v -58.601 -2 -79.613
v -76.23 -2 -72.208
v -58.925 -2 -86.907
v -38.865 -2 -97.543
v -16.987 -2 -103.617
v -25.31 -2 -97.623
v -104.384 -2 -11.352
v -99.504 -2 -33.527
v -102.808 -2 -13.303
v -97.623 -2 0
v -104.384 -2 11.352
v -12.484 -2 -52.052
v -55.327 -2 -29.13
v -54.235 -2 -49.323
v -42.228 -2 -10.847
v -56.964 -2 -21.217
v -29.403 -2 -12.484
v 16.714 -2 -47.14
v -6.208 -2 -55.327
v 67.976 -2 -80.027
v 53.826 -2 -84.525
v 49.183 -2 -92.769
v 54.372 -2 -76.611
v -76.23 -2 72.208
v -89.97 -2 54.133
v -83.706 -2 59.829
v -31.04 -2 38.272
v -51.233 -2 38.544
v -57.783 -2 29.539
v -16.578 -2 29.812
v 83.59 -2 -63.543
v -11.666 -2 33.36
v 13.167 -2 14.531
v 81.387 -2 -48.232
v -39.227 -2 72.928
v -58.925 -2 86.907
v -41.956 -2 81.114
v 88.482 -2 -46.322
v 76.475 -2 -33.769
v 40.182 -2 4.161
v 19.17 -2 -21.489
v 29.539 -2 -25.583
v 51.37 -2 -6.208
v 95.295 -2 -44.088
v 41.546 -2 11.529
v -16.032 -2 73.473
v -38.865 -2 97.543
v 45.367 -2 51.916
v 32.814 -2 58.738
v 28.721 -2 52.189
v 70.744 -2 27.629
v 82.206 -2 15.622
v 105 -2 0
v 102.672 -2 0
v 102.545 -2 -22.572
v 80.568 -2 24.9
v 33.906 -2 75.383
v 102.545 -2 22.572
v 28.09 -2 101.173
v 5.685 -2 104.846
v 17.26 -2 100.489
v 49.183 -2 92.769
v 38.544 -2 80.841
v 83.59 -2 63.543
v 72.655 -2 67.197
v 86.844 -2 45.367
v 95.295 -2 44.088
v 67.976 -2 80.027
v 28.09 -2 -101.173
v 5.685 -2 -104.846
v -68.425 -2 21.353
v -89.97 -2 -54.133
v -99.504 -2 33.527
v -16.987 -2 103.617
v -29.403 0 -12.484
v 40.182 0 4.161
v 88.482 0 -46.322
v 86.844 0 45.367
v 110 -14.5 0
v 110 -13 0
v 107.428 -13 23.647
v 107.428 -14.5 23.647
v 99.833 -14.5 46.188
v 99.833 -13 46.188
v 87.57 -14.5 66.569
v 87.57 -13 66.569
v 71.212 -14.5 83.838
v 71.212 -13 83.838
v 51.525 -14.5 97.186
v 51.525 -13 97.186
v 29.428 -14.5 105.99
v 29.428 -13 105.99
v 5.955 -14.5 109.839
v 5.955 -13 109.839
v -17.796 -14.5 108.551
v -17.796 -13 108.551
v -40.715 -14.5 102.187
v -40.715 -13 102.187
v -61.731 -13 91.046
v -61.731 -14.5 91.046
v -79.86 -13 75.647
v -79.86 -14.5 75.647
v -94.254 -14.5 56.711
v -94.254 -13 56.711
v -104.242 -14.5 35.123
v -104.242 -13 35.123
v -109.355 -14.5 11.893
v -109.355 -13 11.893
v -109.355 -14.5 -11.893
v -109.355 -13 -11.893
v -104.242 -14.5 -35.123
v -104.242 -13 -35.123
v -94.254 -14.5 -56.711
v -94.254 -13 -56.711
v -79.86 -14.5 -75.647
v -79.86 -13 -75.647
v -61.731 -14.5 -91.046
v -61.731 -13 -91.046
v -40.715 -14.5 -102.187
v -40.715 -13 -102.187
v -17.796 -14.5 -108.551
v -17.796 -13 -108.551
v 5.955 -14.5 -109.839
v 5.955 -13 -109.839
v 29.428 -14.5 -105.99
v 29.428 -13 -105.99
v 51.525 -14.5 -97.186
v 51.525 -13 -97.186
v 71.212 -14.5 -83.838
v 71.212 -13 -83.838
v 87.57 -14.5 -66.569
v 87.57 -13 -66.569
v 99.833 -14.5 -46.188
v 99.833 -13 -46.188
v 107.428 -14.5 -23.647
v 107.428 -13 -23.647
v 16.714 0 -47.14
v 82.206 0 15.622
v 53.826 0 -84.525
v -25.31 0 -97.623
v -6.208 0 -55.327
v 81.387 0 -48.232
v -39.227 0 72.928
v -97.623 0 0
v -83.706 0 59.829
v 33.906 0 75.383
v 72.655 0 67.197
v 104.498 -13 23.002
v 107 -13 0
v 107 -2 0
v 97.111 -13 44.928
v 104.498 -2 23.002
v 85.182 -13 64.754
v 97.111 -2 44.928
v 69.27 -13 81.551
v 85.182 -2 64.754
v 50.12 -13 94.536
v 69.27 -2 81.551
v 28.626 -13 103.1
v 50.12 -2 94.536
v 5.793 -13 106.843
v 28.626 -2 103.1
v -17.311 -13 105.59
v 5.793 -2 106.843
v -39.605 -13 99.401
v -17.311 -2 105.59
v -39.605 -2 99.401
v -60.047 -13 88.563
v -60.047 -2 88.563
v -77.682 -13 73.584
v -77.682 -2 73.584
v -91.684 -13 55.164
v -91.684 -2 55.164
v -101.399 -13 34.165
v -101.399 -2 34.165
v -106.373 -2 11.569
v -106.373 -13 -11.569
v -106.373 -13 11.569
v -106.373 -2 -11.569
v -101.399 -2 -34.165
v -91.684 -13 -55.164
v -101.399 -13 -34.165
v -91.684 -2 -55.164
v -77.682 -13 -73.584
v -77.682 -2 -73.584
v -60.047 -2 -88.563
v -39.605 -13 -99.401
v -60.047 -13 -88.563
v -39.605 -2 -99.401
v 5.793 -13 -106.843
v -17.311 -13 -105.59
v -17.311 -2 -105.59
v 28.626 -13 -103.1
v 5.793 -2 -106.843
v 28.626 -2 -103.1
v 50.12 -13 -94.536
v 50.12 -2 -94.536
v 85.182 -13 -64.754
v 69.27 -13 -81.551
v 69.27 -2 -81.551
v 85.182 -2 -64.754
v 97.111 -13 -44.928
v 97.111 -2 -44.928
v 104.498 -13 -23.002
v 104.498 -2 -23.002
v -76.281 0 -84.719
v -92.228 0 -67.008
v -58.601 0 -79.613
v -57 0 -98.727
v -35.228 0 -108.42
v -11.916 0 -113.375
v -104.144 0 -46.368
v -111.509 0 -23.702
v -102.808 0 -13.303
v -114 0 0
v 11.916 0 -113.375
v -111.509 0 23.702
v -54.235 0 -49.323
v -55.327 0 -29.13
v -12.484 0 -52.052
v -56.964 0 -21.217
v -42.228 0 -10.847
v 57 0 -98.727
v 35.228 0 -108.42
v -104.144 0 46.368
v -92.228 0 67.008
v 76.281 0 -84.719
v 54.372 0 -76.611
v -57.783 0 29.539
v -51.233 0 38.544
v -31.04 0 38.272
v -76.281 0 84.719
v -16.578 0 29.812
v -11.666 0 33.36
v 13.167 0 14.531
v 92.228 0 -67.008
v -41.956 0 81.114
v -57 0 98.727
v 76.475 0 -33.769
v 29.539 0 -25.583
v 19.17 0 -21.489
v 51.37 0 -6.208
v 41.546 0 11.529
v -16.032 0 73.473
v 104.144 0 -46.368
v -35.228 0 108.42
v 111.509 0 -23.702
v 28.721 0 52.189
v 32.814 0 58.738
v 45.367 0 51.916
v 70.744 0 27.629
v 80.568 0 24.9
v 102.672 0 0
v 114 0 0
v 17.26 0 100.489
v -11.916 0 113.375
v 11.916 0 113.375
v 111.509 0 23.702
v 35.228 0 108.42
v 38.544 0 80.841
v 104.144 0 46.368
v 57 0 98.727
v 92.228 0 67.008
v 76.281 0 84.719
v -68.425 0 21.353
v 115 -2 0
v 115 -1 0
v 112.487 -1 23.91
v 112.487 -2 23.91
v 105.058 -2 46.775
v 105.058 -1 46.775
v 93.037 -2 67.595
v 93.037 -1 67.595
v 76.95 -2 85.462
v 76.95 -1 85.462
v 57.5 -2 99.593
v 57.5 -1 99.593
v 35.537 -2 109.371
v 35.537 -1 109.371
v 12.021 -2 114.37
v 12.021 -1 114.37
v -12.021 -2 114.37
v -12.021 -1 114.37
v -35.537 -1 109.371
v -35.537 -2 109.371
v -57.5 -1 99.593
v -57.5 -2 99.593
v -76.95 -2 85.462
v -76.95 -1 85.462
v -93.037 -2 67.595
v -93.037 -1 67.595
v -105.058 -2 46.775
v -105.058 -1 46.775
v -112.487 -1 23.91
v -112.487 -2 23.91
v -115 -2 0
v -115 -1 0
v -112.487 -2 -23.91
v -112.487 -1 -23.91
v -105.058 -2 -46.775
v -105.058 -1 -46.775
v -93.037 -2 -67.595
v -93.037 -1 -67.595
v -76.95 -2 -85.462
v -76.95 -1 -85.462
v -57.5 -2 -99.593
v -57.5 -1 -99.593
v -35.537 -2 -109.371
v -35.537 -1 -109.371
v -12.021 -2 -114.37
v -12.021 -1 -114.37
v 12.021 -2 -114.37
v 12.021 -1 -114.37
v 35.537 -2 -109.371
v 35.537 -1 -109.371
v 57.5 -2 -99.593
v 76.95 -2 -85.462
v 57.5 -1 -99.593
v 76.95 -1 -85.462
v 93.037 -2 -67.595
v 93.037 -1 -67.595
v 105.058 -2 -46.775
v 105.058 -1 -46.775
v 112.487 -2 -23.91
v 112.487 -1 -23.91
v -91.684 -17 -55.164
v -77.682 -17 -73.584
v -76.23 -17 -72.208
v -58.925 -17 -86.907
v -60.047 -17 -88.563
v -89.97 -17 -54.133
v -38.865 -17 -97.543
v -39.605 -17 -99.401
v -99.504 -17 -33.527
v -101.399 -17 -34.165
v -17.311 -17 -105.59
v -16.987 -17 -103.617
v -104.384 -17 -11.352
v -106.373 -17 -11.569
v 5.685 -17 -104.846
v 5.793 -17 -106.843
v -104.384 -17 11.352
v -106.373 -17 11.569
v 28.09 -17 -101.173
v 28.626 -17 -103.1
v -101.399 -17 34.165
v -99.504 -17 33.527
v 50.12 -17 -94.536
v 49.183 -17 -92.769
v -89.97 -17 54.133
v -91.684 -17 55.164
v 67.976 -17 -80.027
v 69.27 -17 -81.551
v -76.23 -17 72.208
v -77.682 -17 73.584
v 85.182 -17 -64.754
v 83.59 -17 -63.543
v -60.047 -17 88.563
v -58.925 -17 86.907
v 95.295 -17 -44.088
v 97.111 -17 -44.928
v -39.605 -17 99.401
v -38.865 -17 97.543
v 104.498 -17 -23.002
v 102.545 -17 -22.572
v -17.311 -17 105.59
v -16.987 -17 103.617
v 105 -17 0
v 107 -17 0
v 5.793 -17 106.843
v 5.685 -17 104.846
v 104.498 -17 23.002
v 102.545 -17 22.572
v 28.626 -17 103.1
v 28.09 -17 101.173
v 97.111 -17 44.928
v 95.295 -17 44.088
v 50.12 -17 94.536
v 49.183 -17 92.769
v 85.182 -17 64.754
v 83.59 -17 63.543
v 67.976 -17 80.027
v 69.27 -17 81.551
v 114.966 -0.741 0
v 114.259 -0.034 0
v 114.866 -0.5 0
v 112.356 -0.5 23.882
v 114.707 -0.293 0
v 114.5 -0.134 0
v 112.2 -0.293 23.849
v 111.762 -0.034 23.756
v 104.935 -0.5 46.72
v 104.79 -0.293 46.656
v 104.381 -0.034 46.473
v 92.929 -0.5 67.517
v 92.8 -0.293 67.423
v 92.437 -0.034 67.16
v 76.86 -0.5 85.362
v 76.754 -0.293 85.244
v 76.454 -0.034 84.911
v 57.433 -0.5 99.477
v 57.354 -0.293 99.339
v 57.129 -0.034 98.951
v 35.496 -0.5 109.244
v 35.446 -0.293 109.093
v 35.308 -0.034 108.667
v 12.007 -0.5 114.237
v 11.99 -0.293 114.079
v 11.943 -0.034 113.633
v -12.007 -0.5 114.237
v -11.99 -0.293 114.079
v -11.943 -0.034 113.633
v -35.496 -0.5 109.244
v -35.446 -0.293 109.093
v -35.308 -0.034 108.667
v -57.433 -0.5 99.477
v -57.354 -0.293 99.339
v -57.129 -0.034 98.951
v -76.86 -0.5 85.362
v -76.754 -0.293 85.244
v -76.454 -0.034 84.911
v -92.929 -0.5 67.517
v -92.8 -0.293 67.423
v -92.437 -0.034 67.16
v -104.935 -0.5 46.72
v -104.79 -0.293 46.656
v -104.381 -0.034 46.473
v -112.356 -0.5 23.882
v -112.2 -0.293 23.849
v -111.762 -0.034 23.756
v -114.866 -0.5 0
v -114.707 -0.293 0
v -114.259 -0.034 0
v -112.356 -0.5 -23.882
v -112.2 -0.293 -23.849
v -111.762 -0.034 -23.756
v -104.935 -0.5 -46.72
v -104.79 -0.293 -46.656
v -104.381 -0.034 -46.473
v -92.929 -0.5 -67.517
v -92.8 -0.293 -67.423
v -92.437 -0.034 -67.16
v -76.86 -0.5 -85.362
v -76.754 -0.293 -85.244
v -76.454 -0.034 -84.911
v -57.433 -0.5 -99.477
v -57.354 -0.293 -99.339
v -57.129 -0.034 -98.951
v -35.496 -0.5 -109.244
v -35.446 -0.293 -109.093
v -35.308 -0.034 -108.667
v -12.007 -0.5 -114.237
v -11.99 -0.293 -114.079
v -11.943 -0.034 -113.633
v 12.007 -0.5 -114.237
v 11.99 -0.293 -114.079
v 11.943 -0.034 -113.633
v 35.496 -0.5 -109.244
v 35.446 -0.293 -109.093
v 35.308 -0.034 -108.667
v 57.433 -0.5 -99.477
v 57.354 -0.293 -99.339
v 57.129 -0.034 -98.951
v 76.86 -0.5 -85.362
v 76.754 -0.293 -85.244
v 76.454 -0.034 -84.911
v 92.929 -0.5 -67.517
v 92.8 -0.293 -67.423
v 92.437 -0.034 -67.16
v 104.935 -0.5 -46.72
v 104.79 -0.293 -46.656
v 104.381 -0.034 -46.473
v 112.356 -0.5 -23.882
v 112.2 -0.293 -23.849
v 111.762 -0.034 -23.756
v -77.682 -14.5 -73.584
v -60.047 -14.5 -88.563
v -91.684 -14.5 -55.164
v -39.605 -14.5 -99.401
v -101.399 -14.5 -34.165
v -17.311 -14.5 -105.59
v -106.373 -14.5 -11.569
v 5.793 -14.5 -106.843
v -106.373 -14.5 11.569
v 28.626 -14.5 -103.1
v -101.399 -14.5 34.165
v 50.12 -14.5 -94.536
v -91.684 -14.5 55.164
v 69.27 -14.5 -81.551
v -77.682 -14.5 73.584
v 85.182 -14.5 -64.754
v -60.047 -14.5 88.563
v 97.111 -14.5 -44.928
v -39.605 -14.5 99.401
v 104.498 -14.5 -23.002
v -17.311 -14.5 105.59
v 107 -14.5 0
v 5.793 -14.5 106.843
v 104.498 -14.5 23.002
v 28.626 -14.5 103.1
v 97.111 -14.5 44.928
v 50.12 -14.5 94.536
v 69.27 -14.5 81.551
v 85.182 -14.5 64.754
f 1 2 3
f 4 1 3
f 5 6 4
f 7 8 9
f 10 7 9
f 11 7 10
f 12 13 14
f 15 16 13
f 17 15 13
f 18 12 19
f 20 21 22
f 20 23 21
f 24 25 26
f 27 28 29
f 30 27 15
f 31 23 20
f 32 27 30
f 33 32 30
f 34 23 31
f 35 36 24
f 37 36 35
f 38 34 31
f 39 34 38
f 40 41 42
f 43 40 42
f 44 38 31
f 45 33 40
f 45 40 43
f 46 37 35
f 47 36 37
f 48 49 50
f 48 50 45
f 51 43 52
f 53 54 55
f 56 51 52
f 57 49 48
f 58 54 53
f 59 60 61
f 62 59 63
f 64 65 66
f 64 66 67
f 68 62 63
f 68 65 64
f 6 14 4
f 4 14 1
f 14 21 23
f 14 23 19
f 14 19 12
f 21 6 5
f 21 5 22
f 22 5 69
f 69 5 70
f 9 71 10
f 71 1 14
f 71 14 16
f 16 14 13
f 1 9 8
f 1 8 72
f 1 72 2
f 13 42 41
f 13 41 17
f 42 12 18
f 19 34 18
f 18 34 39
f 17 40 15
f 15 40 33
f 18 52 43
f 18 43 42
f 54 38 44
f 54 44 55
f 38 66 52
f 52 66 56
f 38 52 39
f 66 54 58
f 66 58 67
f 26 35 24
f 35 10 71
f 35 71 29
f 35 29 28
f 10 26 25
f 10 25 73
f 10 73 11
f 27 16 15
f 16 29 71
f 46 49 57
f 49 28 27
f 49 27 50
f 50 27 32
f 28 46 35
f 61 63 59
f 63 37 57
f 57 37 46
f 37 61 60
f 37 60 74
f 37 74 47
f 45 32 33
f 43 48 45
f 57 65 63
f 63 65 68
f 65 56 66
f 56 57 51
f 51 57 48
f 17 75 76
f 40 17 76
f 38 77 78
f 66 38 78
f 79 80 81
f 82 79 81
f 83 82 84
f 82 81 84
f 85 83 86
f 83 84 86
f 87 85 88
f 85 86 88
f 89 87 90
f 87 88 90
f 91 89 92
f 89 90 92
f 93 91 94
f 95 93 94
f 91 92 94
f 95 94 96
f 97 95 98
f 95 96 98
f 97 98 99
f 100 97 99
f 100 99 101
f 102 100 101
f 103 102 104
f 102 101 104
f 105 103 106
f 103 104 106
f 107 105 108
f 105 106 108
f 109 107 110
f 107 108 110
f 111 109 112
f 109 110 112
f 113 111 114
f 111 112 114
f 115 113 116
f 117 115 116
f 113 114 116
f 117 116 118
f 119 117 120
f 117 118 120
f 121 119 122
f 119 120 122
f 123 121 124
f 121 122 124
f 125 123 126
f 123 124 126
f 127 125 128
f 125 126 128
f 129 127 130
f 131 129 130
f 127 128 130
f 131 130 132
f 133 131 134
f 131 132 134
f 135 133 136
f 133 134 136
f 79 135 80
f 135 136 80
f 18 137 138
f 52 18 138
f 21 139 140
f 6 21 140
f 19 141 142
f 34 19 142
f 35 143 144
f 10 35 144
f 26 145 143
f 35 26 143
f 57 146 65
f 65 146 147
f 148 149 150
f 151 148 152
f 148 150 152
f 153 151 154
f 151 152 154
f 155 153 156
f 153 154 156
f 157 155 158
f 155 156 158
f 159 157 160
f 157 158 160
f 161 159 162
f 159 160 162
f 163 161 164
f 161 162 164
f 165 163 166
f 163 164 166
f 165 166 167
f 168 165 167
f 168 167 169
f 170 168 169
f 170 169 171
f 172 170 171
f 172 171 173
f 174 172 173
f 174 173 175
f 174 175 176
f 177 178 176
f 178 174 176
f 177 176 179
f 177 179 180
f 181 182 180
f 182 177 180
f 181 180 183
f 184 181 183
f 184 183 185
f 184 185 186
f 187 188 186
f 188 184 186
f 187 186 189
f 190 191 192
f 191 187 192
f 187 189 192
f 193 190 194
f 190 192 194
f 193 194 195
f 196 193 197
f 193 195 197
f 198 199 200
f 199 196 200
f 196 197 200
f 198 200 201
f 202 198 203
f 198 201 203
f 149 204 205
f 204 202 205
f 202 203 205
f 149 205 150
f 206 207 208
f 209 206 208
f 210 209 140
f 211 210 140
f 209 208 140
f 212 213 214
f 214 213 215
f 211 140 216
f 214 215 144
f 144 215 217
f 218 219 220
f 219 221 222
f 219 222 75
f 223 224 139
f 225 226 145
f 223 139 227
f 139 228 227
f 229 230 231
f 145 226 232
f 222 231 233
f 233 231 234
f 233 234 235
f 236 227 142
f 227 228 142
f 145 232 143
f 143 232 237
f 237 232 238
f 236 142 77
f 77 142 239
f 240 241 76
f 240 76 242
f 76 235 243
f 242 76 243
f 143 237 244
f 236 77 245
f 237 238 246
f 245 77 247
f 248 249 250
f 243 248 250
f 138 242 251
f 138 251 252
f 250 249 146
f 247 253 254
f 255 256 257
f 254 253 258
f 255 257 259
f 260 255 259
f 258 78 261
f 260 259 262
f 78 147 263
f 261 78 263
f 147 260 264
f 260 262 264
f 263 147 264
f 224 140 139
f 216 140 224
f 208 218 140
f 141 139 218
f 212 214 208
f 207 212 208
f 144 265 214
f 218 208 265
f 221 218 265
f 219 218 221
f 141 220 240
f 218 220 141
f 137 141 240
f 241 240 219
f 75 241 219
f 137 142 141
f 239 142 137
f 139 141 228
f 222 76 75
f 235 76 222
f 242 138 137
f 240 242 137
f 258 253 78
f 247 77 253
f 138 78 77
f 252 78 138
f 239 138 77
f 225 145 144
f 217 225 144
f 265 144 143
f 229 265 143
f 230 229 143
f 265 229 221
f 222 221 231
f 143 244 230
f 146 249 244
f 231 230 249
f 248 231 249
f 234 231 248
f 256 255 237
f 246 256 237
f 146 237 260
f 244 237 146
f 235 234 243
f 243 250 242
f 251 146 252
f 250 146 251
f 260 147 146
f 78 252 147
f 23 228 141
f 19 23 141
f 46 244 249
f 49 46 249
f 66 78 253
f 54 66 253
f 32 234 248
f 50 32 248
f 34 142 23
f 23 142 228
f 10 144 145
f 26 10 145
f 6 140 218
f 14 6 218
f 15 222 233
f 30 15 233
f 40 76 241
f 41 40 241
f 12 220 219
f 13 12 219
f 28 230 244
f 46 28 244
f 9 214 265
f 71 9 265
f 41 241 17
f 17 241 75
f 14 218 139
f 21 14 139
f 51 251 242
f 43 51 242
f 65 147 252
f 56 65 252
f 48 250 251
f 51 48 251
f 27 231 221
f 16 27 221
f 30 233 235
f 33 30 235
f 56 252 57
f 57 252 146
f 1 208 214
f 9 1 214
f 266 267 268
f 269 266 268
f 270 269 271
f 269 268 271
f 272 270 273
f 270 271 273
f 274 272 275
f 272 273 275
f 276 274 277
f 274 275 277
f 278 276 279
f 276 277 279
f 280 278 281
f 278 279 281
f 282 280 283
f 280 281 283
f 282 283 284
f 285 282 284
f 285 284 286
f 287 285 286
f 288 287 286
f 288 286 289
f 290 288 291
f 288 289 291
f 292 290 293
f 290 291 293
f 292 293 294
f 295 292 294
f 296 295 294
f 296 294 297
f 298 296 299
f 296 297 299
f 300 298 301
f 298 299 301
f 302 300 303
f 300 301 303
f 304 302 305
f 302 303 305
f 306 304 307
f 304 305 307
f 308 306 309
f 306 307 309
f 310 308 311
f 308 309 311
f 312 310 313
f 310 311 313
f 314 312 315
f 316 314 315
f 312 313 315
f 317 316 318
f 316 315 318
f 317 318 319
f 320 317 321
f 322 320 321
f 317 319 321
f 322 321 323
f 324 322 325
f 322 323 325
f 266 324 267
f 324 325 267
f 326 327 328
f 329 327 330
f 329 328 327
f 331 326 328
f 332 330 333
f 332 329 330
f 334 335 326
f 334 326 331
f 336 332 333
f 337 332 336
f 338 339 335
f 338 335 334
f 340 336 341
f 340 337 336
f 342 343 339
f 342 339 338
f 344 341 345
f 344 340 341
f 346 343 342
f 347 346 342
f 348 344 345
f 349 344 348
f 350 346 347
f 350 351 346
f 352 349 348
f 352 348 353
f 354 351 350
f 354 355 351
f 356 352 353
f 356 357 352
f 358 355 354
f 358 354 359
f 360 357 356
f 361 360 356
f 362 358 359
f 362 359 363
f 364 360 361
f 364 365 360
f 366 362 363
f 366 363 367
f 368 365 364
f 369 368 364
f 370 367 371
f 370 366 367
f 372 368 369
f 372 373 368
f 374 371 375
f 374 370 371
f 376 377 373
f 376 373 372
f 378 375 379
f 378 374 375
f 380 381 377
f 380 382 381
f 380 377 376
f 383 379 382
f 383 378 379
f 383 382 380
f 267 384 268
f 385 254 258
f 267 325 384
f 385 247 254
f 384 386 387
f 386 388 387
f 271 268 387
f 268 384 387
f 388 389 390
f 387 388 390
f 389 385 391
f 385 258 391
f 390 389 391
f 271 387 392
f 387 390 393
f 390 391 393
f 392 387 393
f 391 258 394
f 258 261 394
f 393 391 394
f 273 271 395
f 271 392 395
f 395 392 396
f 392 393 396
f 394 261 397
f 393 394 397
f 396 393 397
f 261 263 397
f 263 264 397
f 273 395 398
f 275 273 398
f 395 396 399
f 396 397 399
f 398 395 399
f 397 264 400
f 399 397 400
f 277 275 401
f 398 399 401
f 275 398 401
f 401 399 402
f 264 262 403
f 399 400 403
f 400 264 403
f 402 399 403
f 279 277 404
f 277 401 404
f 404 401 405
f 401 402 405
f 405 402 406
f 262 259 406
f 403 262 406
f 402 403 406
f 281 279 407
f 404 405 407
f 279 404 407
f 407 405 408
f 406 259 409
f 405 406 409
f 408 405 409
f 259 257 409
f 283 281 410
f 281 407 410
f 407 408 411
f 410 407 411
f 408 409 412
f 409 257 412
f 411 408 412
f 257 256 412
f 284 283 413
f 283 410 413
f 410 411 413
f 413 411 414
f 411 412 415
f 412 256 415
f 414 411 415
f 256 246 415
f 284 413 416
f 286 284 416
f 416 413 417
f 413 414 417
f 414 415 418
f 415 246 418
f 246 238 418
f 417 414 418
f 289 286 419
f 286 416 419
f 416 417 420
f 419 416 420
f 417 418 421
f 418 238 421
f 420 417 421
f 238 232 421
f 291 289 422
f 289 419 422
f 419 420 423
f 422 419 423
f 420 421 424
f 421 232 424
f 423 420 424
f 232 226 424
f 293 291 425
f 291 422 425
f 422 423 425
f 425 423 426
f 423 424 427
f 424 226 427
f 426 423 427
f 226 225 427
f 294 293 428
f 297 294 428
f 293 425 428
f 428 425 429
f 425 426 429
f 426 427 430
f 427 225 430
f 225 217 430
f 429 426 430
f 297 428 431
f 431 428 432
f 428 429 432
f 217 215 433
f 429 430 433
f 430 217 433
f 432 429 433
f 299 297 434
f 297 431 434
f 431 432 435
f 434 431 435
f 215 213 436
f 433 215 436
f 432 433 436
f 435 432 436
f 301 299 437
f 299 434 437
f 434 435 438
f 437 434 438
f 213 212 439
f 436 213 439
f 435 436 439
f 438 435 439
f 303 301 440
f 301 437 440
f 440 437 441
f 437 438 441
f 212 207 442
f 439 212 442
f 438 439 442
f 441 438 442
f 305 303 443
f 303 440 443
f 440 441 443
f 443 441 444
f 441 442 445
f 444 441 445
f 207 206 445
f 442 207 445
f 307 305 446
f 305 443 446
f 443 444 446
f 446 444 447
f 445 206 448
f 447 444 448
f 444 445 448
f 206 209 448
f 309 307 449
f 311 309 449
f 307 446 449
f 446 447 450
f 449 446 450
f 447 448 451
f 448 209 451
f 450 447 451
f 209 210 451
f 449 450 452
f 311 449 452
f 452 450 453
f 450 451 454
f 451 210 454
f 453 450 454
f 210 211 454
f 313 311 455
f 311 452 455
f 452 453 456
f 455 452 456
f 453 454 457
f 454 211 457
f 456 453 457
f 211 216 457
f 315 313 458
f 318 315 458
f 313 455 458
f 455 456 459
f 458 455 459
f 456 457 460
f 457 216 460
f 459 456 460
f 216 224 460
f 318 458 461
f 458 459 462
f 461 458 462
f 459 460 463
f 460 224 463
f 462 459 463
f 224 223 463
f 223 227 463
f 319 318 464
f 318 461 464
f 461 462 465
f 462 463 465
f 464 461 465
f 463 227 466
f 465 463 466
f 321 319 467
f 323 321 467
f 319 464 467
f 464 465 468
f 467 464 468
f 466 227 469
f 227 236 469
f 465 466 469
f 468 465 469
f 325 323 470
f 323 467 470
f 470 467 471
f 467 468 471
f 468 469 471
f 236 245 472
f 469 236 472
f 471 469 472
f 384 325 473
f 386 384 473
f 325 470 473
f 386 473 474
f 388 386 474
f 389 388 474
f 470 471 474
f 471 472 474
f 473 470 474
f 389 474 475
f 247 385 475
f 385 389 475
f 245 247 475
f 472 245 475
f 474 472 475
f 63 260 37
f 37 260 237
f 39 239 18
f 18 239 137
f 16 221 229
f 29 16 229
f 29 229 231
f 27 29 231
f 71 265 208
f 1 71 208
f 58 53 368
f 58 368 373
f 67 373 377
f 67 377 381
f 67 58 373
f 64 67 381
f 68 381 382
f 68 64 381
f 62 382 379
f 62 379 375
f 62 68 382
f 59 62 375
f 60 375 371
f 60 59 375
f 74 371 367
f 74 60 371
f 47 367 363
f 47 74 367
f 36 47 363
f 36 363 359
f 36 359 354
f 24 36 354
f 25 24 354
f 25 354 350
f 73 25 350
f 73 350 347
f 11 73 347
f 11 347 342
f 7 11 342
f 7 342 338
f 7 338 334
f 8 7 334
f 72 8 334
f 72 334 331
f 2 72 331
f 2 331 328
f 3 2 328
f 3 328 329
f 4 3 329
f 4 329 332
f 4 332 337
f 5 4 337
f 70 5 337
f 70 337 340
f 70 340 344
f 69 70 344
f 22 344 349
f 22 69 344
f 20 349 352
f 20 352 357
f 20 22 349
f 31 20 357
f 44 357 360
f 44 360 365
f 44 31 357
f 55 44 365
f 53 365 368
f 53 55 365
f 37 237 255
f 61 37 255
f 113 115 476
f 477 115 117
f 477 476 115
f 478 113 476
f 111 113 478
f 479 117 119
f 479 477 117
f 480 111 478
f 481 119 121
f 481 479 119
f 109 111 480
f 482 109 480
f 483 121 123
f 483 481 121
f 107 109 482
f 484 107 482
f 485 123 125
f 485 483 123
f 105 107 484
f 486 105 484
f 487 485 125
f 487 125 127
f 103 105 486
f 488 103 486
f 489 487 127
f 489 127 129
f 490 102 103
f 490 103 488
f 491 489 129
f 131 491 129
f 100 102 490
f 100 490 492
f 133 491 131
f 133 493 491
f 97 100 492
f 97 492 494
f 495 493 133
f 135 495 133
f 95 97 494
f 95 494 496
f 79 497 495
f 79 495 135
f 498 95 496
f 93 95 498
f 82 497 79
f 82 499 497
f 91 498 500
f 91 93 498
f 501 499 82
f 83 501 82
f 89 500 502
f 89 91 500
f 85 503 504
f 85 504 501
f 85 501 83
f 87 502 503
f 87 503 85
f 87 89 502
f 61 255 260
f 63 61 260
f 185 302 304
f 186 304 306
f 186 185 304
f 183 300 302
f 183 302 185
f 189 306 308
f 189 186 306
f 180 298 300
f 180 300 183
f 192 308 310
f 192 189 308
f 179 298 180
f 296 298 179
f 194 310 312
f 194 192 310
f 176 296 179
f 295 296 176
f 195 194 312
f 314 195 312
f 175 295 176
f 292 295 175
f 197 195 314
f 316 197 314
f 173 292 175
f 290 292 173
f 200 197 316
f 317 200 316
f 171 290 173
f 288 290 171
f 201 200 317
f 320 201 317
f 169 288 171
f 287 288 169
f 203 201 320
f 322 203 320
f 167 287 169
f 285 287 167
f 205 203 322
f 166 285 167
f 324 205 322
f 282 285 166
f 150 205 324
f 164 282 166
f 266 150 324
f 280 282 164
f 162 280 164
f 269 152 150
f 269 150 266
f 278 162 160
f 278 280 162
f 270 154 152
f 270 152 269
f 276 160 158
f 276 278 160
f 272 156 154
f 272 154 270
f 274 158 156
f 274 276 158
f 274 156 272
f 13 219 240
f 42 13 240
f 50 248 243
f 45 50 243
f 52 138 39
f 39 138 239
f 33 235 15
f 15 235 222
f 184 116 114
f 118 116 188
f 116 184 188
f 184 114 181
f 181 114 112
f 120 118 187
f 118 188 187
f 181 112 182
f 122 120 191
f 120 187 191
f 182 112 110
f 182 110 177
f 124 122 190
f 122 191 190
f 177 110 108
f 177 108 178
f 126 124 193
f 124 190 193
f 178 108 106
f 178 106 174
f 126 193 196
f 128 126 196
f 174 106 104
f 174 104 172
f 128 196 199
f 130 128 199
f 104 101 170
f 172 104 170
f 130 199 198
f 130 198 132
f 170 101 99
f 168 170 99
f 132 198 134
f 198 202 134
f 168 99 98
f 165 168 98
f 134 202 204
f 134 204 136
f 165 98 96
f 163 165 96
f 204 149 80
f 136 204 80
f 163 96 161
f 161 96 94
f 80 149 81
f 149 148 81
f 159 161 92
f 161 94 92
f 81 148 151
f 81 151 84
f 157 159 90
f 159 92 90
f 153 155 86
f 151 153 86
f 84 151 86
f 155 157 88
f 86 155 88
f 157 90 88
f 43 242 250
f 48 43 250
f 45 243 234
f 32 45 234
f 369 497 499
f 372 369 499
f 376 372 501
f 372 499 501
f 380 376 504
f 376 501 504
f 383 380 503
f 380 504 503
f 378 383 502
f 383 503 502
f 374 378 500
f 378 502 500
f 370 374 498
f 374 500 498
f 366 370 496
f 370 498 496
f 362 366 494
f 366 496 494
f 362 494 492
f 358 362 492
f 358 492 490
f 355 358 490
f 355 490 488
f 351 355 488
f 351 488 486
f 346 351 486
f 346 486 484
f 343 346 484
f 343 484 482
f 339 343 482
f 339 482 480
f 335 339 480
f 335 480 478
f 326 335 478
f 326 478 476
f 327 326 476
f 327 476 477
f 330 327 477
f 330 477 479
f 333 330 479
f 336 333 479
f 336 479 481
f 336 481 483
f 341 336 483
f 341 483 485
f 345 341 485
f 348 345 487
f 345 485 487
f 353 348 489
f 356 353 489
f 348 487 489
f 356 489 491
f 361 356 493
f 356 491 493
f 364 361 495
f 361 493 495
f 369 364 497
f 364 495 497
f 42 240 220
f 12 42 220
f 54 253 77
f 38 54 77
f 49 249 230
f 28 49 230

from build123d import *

# Parameters (mm, degrees)
F0_R      = 115
F1_DEPTH  = 2
F2_R      = 107
F2_R_2    = 105
F3_DEPTH  = 15
F5_R      = 110
F6_DEPTH  = 1.5
F7_R      = 1
F6_FACE_R = 105
F9_DEPTH  = 12
F11_DEPTH = 15
F13_DEPTH = 15


with BuildPart() as f1:
    # F0 (on Front) → F1 (new body)
    with BuildSketch(Plane.XZ):
        Circle(F0_R)
    extrude(amount=F1_DEPTH)

    # F2 (on face) → F3 (join)
    with BuildSketch(Plane.XZ.offset(2)):
        Circle(F2_R)
        Circle(F2_R_2, mode=Mode.SUBTRACT)
    extrude(amount=F3_DEPTH)

    # F5 (on offset) → F6 (join)
    with BuildSketch(Plane.XZ.offset(13)):
        Circle(F5_R)
    extrude(amount=F6_DEPTH)

    # F7
    f7_edges = [f1.edges().sort_by_distance(p)[0] for p in [
        (-115, 0, 0),
    ]]
    fillet(f7_edges, radius=F7_R)

    # F6_face (on face) → F9 (cut)
    with BuildSketch(Plane.XZ.offset(14.5)):
        Circle(F6_FACE_R)
    extrude(amount=-F9_DEPTH, mode=Mode.SUBTRACT)

    # F10 (on face) → F11 (cut)
    with BuildSketch(Plane(origin=(0, 0, 0), x_dir=(-1, 0, 0), z_dir=(0, 1, 0))):
        Polygon((-17.259745, 100.488558), (-38.544491, 80.841102), (41.955505, 81.113979), align=None)
        Polygon((83.706349, 59.829235), (39.226692, 72.927542), (97.623304, 0), align=None)
        Polygon((102.808043, -13.302966), (68.425, 21.352965), (58.601268, -79.613134), align=None)
        Polygon((25.309743, -97.623304), (54.235172, -49.323305), (-53.825844, -84.524997), align=None)
        Polygon((-81.386864, -48.231781), (-54.37161, -76.611444), (6.208051, -55.326693), align=None)
        Polygon((-102.671608, 0), (-88.481776, -46.321612), (-86.844489, 45.366522), align=None)
        Polygon((-33.905506, 75.383477), (-72.654657, 67.197032), (-80.568217, 24.900423), align=None)
    extrude(amount=-F11_DEPTH, mode=Mode.SUBTRACT)

    # F12 (on face) → F13 (cut)
    with BuildSketch(Plane(origin=(0, 0, 0), x_dir=(-1, 0, 0), z_dir=(0, 1, 0))):
        Polygon((16.031779, 73.473305), (-32.813981, 58.73771), (51.23347, 38.544491), align=None)
        Polygon((57.782628, 29.539406), (31.040253, 38.27161), (56.963984, -21.216525), align=None)
        Polygon((12.484324, -52.052118), (55.326689, -29.130084), (-29.539406, -25.582626), align=None)
        Polygon((-76.474994, -33.769067), (-16.713982, -47.140256), (-82.205504, 15.622457), align=None)
        Polygon((-51.369913, -6.208051), (-45.366526, 51.915679), (-70.744492, 27.629238), align=None)
        Polygon((11.665677, 33.359747), (-28.720763, 52.18856), (-41.546185, 11.529238), align=None)
        Polygon((42.22839, -10.847033), (16.577544, 29.812288), (-13.166525, 14.530932), align=None)
        Polygon((-19.169914, -21.489406), (29.402964, -12.484322), (-40.181778, 4.161441), align=None)
    extrude(amount=-F13_DEPTH, mode=Mode.SUBTRACT)


solid = f1.part
